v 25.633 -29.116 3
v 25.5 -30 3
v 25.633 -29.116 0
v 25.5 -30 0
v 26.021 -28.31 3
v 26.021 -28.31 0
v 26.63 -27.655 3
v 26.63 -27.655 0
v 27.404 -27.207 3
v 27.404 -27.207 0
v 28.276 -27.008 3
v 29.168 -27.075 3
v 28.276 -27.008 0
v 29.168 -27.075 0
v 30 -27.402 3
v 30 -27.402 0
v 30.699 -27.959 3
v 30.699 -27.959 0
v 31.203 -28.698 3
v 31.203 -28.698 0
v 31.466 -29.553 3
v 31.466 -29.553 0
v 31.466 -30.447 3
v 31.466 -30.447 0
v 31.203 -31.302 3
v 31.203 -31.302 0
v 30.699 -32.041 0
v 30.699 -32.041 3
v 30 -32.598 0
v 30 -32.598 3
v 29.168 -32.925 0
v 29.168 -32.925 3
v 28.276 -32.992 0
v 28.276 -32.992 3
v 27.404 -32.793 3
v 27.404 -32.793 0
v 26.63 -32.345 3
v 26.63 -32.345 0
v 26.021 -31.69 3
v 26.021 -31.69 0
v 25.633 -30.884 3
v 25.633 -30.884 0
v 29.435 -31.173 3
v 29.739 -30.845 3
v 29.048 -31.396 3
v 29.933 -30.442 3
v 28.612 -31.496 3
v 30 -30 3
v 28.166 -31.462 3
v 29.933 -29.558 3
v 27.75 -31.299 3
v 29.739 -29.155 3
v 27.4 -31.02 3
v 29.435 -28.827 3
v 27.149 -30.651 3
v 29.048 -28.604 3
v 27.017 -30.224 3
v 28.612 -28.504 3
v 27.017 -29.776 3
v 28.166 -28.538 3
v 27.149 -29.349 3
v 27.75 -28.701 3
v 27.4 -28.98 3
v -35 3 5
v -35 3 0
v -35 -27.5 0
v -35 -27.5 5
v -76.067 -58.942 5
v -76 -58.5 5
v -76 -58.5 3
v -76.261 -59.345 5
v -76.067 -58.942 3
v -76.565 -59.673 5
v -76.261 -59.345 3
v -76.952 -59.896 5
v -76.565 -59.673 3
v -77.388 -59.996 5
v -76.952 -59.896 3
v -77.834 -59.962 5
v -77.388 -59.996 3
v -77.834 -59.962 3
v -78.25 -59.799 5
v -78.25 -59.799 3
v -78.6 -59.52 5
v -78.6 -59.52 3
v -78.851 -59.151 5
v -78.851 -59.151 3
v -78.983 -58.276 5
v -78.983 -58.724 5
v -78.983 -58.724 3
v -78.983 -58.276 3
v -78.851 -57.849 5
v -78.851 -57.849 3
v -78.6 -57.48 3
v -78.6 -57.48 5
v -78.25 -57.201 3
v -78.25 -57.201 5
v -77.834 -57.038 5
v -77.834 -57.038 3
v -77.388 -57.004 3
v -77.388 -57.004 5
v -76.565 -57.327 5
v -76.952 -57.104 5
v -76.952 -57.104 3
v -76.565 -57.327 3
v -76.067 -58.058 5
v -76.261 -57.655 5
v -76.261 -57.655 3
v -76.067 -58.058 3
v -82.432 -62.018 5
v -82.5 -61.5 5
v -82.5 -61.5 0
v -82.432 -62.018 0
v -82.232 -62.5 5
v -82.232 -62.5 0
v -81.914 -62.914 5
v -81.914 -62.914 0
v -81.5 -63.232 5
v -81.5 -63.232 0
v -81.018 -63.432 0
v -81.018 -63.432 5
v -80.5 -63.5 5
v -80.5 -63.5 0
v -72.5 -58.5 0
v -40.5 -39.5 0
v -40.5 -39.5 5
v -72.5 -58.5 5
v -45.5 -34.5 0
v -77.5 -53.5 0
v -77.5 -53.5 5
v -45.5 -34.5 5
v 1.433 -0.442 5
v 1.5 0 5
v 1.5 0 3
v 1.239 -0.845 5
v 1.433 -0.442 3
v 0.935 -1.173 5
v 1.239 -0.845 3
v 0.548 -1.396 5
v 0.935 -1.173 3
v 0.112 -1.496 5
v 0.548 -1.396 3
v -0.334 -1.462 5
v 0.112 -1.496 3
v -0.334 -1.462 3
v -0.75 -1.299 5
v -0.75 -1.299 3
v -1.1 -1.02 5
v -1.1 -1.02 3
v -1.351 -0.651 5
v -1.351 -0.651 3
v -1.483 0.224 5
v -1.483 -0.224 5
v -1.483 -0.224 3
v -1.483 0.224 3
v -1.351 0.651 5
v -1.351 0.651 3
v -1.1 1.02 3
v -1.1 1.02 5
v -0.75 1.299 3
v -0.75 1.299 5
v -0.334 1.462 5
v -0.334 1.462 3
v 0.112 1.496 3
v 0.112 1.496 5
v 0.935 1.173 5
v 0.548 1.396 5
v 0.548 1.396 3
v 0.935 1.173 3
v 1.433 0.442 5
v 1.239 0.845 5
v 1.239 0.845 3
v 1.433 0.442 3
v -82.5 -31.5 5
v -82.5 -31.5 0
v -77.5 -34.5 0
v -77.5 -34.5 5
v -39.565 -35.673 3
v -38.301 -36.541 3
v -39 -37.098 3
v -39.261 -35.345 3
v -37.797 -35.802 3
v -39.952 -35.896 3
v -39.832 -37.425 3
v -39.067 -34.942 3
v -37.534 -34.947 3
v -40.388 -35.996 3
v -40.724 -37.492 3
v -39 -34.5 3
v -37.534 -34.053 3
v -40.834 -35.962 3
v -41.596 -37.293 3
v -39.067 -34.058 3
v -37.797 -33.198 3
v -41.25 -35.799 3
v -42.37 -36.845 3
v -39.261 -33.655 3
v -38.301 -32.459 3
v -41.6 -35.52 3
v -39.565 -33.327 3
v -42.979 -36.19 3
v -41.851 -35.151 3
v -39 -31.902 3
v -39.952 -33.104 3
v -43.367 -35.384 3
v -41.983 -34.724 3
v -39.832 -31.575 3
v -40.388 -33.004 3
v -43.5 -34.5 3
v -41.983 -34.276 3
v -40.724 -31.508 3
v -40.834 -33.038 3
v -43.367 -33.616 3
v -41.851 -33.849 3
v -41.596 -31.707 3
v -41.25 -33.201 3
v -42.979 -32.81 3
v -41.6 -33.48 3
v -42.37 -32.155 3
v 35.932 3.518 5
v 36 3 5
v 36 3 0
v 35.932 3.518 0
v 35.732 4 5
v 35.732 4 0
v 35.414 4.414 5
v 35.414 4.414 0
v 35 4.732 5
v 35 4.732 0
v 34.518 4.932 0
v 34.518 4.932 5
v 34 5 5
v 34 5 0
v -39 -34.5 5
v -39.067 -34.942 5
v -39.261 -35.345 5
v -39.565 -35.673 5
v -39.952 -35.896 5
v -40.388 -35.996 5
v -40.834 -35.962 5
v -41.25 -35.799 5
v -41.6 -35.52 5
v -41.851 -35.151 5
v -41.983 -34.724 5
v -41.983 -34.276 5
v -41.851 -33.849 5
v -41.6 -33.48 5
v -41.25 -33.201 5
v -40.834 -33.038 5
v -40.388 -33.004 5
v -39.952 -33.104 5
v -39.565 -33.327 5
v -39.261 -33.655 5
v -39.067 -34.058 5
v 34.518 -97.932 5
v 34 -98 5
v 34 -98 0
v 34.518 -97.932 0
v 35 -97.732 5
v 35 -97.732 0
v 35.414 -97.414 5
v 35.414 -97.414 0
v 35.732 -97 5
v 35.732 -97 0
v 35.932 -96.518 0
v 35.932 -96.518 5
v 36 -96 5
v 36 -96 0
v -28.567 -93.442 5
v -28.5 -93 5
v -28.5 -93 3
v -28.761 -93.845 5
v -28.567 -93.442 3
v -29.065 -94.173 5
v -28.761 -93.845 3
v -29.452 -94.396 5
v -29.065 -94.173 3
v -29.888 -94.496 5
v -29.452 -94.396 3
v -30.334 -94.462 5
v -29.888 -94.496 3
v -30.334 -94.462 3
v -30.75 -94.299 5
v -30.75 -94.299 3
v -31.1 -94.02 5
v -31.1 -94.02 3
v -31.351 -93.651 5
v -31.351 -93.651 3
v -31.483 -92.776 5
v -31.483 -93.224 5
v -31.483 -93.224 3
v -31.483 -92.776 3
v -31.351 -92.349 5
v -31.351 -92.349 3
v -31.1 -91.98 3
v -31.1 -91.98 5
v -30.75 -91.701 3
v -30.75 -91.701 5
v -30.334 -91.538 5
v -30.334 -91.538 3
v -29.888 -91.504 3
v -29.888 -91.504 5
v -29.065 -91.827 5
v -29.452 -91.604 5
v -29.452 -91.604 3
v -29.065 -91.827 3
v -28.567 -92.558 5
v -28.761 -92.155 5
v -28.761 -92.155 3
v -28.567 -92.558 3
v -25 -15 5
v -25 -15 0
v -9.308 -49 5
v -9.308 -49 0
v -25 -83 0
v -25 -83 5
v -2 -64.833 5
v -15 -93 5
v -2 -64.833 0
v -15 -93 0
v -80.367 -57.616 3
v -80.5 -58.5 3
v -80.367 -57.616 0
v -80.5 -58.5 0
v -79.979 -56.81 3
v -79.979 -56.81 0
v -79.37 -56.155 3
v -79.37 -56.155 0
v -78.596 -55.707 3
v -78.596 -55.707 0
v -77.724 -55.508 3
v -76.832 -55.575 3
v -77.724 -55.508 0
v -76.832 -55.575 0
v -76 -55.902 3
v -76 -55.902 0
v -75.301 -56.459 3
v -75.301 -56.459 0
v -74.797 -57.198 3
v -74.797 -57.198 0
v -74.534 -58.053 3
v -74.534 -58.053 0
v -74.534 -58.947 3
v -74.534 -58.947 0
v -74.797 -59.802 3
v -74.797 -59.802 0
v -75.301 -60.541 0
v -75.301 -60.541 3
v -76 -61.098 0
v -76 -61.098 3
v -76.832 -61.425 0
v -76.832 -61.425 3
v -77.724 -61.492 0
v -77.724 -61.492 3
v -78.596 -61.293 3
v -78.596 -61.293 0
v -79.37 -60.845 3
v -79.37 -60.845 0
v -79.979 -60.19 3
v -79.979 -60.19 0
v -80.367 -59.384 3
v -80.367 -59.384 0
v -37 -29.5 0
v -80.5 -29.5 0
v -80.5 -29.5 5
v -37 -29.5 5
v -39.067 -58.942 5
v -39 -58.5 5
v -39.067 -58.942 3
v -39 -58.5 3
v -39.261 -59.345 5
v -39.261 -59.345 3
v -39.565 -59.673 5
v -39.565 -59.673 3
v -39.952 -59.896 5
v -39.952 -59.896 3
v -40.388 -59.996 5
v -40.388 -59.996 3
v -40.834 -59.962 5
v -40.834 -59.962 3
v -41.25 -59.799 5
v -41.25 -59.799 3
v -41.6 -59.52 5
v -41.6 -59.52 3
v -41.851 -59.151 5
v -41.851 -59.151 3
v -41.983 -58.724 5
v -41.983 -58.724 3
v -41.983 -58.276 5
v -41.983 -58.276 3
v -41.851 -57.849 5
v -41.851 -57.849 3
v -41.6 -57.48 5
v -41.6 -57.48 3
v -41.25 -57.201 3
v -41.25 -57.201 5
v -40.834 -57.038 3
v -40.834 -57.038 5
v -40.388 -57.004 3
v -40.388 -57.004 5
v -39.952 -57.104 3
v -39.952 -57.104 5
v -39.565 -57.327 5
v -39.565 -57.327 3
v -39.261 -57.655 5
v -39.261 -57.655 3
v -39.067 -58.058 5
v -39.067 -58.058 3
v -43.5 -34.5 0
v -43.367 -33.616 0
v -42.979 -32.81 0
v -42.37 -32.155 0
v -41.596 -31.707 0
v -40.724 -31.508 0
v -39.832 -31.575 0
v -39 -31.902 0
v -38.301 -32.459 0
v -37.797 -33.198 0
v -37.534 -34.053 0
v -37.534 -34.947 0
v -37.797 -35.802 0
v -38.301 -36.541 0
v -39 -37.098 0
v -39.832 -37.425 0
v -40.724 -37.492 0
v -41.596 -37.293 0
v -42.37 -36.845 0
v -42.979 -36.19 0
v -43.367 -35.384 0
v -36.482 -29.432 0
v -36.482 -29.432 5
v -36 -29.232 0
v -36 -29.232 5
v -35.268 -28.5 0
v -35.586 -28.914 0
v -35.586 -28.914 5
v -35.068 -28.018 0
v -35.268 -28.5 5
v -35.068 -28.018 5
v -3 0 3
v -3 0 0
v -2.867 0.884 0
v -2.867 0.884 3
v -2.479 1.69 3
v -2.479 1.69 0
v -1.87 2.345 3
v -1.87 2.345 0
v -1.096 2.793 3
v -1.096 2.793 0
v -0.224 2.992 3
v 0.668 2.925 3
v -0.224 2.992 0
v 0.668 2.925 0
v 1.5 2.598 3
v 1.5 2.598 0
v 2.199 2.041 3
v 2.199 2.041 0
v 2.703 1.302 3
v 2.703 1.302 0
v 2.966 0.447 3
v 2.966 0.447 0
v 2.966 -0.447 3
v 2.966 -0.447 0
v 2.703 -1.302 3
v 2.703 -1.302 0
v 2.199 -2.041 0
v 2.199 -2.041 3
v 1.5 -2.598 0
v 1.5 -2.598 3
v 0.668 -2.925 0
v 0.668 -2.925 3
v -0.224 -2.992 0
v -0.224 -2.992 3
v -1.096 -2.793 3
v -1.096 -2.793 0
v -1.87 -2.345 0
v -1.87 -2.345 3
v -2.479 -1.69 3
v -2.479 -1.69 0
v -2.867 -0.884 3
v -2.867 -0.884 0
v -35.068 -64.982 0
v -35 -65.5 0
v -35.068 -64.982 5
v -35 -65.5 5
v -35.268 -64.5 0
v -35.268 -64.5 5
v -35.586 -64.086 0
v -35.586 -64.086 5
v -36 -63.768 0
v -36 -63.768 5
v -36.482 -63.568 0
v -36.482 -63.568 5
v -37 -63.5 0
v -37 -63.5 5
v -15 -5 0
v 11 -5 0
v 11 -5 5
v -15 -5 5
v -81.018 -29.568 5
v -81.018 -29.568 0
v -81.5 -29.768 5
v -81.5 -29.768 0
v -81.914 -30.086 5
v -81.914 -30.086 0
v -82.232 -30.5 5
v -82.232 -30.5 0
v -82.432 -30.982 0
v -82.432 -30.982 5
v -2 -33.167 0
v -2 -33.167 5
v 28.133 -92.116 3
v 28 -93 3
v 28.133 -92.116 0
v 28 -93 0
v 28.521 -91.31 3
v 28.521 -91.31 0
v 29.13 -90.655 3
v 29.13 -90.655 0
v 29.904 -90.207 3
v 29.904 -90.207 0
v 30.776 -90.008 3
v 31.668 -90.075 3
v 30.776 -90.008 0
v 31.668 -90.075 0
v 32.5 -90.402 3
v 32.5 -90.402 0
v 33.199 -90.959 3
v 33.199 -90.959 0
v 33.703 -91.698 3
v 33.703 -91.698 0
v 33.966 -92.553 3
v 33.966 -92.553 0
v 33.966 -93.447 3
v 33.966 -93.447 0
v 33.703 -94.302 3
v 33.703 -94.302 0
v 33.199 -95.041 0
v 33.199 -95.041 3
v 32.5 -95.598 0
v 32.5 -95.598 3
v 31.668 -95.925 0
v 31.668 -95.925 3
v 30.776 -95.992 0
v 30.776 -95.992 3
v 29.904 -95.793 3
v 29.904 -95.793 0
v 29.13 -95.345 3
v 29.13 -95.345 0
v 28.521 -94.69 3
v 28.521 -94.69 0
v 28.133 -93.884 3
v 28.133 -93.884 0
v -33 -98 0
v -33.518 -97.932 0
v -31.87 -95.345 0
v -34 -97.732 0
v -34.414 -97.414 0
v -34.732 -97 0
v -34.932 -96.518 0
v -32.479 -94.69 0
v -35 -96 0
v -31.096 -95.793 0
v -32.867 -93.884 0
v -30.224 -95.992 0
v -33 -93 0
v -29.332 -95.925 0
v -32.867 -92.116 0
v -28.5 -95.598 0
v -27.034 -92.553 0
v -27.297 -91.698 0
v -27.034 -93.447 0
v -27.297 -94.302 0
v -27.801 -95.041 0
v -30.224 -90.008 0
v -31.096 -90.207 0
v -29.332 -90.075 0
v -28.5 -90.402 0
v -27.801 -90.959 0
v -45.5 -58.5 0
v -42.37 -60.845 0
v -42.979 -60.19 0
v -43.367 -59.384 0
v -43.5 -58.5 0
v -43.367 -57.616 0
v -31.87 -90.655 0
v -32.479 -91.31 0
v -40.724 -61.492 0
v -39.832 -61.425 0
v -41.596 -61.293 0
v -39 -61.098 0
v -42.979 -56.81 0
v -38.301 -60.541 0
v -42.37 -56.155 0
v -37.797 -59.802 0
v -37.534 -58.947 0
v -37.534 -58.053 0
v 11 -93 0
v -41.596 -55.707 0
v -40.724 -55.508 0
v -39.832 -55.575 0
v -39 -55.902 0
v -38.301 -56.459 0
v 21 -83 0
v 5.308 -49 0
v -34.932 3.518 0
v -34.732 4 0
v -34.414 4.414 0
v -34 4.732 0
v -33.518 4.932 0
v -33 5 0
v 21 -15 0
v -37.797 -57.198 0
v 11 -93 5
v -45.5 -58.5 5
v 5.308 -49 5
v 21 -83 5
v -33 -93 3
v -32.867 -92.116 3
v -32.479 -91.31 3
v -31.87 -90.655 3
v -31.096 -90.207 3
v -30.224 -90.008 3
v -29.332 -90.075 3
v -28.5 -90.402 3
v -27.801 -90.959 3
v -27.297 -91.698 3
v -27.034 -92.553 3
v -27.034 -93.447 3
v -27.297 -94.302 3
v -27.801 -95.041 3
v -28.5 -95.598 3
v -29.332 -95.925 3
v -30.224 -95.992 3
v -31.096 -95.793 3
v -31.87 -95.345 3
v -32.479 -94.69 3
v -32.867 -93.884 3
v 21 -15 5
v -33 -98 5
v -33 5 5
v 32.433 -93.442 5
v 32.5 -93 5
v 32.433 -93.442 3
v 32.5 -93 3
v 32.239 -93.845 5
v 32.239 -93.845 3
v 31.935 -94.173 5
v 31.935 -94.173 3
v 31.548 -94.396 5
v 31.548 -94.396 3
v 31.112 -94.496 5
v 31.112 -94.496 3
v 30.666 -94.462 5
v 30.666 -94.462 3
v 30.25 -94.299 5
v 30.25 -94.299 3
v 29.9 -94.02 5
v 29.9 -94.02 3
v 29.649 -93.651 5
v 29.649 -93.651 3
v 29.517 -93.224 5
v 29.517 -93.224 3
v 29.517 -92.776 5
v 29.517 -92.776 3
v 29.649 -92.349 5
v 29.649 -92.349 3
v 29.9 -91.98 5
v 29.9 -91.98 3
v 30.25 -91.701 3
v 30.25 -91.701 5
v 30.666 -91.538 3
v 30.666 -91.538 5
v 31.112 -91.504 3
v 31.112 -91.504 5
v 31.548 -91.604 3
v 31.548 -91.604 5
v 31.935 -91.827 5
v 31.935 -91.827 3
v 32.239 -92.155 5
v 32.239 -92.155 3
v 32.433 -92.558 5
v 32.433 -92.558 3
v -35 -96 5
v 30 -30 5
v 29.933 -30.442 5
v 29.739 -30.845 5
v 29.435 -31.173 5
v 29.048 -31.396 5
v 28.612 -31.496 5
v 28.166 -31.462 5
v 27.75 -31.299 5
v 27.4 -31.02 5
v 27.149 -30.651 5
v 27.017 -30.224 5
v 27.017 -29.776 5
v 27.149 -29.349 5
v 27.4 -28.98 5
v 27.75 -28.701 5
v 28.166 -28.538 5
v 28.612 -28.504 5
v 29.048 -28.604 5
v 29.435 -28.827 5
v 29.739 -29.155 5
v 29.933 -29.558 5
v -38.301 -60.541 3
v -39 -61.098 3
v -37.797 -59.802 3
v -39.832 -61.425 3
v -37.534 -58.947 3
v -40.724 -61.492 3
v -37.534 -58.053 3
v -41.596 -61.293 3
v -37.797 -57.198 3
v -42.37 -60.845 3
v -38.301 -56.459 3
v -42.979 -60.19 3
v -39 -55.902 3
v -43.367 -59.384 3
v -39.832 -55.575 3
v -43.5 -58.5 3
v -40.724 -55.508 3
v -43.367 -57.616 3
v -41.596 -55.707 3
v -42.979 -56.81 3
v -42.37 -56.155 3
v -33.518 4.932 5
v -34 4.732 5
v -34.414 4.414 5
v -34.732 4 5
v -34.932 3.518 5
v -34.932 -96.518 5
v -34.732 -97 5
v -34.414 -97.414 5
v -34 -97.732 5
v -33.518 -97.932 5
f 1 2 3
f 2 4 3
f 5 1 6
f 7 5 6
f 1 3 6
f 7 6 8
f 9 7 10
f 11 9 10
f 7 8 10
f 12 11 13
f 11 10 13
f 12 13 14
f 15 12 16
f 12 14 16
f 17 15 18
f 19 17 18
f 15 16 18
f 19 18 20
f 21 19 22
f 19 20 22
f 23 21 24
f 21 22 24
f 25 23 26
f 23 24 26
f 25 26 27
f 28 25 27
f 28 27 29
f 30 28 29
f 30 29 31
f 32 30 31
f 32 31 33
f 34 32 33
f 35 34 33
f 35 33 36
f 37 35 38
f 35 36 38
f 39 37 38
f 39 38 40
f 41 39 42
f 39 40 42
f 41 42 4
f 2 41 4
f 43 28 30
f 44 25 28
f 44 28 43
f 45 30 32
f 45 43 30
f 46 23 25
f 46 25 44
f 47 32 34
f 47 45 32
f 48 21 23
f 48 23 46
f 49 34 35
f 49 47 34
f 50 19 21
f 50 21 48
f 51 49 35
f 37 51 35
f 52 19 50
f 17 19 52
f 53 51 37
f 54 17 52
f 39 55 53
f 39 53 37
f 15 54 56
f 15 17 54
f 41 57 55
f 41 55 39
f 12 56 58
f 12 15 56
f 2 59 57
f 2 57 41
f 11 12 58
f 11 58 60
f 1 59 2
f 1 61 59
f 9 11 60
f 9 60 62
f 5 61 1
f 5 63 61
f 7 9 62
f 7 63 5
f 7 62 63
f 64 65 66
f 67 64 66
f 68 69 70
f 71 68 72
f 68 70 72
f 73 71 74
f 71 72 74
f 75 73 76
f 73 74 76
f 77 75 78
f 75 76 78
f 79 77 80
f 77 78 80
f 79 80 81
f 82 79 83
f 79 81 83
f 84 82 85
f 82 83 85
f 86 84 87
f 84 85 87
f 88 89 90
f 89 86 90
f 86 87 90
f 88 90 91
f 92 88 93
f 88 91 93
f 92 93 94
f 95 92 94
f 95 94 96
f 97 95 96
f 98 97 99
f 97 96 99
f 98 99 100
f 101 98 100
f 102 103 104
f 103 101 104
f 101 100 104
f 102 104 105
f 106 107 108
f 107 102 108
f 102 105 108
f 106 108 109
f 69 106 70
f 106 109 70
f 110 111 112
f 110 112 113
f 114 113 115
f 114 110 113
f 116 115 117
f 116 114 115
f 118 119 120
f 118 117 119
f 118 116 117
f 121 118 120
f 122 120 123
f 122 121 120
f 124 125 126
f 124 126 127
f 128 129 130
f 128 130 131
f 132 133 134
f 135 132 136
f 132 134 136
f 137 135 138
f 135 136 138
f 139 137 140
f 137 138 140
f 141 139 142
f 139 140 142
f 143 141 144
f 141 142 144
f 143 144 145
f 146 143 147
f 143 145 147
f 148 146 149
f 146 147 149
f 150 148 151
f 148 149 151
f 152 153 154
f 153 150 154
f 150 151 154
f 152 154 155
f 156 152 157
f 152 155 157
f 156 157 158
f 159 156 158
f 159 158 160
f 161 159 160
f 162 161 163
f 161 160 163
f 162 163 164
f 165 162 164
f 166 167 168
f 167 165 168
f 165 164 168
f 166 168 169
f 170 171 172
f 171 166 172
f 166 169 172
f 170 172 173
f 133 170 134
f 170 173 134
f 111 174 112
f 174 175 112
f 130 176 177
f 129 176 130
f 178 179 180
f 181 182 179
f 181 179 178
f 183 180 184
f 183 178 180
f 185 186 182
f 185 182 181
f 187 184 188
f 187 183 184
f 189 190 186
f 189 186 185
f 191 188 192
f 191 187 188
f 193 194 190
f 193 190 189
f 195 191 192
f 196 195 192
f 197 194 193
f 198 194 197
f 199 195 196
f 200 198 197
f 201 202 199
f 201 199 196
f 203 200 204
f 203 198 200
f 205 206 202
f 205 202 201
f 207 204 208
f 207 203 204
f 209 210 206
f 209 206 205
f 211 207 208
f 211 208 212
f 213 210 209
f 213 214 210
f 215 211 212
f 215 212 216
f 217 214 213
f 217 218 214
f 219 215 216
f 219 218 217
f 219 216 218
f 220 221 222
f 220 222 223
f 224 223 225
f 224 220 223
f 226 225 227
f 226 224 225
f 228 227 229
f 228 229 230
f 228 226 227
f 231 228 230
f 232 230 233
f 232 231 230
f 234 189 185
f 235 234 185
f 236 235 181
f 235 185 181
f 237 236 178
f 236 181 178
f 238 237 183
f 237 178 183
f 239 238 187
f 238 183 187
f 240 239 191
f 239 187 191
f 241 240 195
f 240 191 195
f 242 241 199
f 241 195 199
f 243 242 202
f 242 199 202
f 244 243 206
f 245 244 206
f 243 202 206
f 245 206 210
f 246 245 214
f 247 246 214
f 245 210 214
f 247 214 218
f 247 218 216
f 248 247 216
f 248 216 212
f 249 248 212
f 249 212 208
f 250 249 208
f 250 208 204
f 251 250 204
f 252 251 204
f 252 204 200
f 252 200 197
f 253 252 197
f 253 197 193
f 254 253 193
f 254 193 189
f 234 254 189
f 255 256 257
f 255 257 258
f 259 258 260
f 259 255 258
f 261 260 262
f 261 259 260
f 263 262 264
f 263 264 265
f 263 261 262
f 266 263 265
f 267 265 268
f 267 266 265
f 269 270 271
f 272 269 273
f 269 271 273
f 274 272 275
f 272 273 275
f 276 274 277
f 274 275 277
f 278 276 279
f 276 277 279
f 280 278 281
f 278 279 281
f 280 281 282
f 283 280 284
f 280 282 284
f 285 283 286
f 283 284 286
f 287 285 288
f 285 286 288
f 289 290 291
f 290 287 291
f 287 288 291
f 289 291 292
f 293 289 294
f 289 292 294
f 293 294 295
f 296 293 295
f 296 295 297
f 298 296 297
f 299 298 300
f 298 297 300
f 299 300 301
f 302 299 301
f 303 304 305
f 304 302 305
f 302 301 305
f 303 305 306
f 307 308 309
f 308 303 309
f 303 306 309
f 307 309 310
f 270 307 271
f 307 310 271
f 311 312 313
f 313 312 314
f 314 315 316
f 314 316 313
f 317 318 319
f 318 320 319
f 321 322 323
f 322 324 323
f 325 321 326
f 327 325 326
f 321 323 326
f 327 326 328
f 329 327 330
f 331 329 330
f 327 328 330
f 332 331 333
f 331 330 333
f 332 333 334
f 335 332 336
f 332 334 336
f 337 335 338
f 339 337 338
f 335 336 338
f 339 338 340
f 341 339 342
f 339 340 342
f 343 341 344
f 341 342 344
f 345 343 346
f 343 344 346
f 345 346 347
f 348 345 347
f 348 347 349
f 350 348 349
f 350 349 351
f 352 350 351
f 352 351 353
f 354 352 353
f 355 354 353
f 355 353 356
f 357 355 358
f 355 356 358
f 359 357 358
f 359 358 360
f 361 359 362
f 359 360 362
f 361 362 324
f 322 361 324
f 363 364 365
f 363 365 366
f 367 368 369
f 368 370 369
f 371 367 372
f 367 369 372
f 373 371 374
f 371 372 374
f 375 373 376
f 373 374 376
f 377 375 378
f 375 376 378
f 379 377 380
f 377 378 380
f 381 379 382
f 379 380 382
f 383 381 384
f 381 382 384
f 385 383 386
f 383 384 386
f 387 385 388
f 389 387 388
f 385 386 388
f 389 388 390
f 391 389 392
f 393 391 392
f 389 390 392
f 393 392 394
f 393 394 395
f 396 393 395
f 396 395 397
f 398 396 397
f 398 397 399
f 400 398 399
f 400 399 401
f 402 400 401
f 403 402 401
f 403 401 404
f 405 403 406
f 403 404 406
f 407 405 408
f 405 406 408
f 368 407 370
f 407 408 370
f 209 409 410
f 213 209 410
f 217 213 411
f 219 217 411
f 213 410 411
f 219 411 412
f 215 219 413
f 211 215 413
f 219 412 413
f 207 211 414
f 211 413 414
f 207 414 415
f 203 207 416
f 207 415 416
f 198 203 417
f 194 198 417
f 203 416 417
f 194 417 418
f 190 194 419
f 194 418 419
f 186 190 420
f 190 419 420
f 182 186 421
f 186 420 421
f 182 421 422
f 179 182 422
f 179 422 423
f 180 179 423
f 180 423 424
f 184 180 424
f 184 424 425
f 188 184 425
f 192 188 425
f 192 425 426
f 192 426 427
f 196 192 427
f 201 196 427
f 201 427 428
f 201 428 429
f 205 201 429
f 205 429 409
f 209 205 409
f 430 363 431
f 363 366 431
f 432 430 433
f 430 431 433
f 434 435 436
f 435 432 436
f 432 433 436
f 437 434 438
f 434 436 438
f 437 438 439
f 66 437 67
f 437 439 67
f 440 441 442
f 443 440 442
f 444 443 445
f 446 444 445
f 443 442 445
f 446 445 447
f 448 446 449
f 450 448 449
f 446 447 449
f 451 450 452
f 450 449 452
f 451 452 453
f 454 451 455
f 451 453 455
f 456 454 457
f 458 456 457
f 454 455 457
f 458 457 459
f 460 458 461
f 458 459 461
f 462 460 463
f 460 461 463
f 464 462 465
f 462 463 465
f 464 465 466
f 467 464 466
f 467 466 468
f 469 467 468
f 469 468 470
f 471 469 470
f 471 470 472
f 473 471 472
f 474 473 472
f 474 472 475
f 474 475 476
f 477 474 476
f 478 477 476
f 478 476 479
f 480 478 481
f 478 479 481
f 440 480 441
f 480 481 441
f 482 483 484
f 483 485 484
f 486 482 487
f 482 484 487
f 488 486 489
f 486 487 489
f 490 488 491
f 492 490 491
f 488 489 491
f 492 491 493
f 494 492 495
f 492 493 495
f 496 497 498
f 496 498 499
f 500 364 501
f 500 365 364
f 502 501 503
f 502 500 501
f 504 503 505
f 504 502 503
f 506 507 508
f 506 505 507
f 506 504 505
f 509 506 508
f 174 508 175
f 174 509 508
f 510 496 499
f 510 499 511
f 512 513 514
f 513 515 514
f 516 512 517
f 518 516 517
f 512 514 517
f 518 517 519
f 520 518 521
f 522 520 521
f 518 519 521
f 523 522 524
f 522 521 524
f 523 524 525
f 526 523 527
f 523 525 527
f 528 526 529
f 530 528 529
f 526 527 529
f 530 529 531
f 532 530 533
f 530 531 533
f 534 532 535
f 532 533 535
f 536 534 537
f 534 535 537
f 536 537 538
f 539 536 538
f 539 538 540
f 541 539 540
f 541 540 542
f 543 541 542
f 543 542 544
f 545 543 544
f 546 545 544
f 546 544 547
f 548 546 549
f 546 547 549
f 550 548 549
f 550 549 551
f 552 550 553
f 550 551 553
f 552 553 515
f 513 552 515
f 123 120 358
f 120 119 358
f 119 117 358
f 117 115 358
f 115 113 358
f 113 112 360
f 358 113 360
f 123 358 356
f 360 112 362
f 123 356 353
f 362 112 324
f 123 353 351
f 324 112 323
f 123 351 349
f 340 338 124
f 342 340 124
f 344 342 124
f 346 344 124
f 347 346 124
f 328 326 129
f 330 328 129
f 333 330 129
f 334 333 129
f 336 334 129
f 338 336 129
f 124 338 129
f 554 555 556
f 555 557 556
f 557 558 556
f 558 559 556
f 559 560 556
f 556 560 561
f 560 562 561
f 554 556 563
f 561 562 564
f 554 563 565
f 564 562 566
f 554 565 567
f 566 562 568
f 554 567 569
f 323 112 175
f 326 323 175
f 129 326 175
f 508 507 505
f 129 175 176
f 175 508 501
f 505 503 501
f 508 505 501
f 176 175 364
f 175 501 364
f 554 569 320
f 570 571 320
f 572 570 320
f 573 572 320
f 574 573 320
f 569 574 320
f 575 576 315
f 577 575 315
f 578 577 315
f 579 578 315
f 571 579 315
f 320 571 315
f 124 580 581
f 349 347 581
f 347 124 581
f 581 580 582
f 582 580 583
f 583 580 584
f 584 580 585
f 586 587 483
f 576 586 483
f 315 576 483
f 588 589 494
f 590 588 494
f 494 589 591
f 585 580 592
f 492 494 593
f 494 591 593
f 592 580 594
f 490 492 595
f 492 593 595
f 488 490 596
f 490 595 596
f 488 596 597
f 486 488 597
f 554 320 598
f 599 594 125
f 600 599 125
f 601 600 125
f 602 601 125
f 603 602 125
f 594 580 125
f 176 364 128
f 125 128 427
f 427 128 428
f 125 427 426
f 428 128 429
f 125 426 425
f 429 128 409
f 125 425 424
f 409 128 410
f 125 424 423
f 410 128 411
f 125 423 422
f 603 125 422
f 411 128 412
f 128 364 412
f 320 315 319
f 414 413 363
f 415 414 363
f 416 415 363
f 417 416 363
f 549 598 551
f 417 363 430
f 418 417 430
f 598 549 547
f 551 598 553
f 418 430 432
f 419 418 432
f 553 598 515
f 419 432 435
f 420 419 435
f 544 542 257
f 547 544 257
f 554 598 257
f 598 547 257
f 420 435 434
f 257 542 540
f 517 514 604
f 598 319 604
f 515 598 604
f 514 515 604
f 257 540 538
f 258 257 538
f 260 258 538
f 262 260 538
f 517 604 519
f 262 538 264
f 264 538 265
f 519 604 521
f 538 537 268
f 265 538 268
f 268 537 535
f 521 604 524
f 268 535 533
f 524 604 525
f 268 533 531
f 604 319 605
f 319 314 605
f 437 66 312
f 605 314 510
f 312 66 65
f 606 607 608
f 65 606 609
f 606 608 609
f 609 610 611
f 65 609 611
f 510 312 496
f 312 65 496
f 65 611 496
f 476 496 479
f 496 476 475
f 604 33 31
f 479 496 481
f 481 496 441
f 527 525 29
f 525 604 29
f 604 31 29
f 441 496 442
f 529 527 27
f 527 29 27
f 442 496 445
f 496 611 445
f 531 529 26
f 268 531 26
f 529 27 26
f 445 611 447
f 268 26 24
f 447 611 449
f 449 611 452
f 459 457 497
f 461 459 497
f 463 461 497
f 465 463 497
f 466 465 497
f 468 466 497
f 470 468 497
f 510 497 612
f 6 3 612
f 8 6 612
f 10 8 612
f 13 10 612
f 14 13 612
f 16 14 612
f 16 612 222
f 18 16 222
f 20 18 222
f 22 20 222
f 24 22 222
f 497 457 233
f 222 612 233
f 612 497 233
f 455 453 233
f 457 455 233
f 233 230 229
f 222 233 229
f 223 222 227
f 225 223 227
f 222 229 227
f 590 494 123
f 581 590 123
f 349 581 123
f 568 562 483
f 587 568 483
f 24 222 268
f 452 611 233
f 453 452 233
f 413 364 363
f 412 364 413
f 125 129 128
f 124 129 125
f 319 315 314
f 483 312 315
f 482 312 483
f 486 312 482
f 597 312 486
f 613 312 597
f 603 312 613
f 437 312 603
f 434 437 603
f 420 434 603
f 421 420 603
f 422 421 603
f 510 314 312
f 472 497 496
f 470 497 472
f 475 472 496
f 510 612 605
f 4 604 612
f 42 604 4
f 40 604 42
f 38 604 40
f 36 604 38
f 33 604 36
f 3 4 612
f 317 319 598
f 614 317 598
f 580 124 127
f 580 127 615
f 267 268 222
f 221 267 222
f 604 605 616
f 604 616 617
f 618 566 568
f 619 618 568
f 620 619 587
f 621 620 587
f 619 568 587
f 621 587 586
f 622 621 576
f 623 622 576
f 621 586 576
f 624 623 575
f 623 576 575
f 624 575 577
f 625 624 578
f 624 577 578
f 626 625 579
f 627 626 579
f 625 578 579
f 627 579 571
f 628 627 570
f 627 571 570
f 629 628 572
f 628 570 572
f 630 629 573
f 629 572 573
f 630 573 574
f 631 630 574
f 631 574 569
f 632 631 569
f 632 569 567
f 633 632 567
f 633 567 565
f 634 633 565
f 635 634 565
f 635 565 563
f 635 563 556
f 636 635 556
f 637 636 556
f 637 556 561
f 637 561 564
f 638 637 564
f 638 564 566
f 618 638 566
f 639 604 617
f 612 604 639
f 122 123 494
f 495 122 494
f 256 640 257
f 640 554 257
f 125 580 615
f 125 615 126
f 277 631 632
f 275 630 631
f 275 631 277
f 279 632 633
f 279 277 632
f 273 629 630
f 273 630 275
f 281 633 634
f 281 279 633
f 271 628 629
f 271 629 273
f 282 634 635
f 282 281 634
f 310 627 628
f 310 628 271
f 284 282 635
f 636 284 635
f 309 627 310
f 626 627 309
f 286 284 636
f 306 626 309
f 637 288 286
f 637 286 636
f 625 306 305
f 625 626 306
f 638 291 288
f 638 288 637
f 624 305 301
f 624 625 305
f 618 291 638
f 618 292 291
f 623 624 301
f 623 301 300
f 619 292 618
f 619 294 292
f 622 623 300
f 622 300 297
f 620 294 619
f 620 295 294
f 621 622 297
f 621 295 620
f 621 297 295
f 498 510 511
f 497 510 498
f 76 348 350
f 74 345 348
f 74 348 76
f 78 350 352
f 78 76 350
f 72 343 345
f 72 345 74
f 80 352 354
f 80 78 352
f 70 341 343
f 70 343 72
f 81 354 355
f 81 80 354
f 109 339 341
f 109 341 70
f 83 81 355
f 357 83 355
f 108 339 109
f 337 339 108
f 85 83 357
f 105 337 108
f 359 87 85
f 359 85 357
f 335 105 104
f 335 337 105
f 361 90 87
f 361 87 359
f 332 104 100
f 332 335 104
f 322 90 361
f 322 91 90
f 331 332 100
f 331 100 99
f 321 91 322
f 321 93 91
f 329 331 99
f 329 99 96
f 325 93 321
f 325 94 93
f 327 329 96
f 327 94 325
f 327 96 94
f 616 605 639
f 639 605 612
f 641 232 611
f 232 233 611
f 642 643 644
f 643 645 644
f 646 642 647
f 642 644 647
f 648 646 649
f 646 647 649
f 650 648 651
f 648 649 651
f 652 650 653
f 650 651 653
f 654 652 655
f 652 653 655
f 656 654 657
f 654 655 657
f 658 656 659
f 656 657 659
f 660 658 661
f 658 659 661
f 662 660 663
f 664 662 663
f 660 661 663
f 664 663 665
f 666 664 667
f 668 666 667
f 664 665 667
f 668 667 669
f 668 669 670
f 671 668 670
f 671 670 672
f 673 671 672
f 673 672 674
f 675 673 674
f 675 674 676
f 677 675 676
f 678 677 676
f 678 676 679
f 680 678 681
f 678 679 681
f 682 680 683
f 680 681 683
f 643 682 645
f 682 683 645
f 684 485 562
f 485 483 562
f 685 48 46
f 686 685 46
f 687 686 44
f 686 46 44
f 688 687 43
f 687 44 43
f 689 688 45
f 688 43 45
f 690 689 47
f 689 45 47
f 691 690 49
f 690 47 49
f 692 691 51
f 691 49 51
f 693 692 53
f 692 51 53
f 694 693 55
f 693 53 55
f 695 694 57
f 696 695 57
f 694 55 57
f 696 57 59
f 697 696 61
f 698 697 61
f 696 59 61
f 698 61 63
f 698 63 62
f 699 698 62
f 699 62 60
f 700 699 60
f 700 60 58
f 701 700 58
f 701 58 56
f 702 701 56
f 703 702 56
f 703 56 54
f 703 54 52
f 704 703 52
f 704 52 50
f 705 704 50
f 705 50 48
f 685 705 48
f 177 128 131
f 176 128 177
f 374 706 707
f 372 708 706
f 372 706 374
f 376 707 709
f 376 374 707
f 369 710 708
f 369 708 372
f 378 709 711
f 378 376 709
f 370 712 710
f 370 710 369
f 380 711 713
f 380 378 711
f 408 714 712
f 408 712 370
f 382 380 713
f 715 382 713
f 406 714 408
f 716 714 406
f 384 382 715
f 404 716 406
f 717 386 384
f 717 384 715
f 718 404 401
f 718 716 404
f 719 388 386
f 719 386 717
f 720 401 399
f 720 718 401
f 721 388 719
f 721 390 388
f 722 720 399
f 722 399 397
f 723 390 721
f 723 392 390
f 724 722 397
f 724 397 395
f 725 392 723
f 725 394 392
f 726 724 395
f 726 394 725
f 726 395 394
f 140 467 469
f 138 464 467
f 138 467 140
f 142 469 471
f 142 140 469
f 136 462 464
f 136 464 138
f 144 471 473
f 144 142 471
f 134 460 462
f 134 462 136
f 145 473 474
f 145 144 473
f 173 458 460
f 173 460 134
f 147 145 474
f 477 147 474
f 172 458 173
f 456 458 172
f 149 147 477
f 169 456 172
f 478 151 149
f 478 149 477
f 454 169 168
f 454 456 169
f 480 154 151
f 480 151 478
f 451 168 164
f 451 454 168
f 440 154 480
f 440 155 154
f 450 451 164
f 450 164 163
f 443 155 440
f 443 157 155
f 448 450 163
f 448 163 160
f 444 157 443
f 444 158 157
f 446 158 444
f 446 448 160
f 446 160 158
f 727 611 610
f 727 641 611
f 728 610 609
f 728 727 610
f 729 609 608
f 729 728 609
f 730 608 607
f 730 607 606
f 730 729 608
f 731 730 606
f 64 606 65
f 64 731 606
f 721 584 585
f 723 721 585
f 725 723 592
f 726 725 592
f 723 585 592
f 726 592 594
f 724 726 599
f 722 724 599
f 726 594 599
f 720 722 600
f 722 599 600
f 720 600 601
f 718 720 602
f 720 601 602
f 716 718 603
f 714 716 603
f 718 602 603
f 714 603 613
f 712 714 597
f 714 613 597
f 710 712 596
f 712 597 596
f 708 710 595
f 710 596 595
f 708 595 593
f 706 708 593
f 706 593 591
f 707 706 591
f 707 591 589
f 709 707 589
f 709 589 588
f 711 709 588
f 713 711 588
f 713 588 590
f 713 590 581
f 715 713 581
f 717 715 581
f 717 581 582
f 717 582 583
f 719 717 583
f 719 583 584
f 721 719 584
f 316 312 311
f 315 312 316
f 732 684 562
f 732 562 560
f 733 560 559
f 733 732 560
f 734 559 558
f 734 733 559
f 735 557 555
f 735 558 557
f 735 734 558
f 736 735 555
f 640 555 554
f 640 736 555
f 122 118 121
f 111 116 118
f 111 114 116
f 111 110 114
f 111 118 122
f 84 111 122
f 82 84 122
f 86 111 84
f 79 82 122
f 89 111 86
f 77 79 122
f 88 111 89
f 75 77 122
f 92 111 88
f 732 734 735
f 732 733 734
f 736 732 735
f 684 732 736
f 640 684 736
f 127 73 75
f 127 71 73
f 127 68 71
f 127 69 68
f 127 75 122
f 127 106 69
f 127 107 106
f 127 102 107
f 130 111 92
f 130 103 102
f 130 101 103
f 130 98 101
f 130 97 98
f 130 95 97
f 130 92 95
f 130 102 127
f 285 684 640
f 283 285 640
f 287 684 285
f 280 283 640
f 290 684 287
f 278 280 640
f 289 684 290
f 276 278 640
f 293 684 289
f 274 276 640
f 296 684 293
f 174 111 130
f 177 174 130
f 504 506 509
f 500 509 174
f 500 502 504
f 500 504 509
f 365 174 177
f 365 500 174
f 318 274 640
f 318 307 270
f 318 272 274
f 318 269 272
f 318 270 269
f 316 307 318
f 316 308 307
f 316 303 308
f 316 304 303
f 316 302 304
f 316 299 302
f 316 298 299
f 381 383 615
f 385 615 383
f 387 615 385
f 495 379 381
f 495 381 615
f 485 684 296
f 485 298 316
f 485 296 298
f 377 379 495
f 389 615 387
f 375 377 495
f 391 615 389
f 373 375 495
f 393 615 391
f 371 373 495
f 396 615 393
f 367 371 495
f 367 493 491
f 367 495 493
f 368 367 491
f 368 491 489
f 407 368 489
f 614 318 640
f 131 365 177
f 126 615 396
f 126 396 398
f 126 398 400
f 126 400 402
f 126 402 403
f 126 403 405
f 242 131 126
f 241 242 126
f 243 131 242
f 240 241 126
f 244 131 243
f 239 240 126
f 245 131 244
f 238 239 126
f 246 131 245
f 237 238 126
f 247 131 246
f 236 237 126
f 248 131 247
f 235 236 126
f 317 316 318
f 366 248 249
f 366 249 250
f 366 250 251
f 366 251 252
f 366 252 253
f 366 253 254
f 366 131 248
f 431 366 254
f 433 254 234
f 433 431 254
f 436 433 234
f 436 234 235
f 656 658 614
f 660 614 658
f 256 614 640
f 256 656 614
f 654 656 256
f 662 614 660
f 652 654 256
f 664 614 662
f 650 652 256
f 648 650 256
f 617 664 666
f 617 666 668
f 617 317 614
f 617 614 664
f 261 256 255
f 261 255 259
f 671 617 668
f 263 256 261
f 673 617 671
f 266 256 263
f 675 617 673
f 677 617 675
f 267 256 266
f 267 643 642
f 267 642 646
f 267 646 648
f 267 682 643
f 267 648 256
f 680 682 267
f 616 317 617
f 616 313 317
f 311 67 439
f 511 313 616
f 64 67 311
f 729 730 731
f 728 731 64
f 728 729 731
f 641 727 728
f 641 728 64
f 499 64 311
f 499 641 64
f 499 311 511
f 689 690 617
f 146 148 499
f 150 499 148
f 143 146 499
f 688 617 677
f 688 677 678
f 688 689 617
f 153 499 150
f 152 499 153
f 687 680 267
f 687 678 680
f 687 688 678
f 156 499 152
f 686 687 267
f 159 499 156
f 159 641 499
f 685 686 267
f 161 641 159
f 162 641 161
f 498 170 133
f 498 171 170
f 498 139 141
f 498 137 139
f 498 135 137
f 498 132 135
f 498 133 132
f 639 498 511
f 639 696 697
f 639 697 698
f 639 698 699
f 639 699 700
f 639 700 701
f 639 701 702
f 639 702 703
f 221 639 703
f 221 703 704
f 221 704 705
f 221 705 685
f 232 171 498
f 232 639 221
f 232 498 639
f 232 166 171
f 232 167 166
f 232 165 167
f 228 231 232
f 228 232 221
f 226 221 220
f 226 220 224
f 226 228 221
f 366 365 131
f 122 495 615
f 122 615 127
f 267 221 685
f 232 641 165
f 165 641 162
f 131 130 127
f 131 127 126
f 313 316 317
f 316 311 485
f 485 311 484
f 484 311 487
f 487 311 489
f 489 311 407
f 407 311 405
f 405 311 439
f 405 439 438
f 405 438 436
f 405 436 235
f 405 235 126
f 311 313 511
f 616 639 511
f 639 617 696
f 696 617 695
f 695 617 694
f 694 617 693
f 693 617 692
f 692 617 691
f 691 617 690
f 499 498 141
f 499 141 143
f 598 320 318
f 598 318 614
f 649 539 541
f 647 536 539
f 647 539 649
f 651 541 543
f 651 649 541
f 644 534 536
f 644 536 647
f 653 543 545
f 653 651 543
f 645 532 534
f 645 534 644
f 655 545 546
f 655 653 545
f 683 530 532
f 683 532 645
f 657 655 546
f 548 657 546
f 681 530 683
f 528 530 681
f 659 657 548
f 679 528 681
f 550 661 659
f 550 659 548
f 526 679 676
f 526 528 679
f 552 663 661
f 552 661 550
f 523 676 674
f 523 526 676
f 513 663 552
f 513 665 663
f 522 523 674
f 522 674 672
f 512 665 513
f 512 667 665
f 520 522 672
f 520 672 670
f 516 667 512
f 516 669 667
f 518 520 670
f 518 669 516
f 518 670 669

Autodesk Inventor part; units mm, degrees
ref_plane "YZ Plane" through (0, 0, 0) normal (1, 0, 0) x (0, 1, 0)
ref_plane "XZ Plane" through (0, 0, 0) normal (0, 1, 0) x (-1, 0, 0)
ref_plane "XY Plane" through (0, 0, 0) normal (0, 0, 1) x (1, 0, 0)
sketch "Boceto1" plane through (0, 0, 0) normal (0, 0, 1) x (1, 0, 0)
  circle A0 centre (0, 0) radius 1.5
  line L0 (0, 0) -> (28.5, 0)
  line L1 (28.5, 0) -> (28.5, -30)
  circle A1 centre (28.5, -30) radius 1.5
  line L2 (28.5, -30) -> (28.5, -93)
  line L3 (28.5, -93) -> (31, -93)
  circle A2 centre (31, -93) radius 1.5
  line L4 (31, -93) -> (-30, -93)
  circle A3 centre (-30, -93) radius 1.5
  line L5 (-30, -98) -> (31, -98)
  line L6 (31, -98) -> (36, -98)
  line L7 (36, -98) -> (36, 0)
  line L8 (36, 0) -> (36, 5)
  line L9 (36, 5) -> (-30, 5)
  line L10 (-30, 5) -> (-35, 5)
  line L11 (-35, 5) -> (-35, -98)
  line L12 (-35, -98) -> (-30, -98)
  line L13 (-40.5, -46.5) -> (-40.5, -34.5)
  line L14 (-40.5, -46.5) -> (-40.5, -58.5)
  circle A4 centre (-40.5, -34.5) radius 1.5
  circle A5 centre (-40.5, -58.5) radius 1.5
  line L15 (-40.5, -58.5) -> (-77.5, -58.5)
  circle A6 centre (-77.5, -58.5) radius 1.5
  line L16 (-82.5, -58.5) -> (-82.5, -63.5)
  line L17 (-82.5, -63.5) -> (-35, -63.5)
  line L18 (-82.5, -58.5) -> (-82.5, -34.5)
  line L19 (-82.5, -34.5) -> (-82.5, -29.5)
  line L20 (-82.5, -29.5) -> (-38, -29.5)
  line L21 (-38, -29.5) -> (-35, -29.5)
  line L22 (-60.25, -58.5) -> (-77.5, -58.5)
  dimension "d0" = 3
  dimension "d1" = 28.5
  dimension "d2" = 30
  dimension "d3" = 3
  dimension "d4" = 63
  dimension "d5" = 2.5
  dimension "d6" = 3
  dimension "d7" = 61
  dimension "d8" = 3
  dimension "d9" = 5
  dimension "d10" = 5
  dimension "d11" = 5
  dimension "d12" = 5
  dimension "d15" = 12
  dimension "d16" = 12
  dimension "d17" = 3
  dimension "d18" = 3
  dimension "d19" = 37
  dimension "d20" = 3
  dimension "d21" = 5
  dimension "d22" = 5
  dimension "d23" = 5
extrude "Extrusión1" add sketch "Boceto1" along normal blind 5
sketch "Boceto2" plane through (0, 0, 0) normal (0, 0, -1) x (-1, 0, 0)
  circle A0 centre (0, 0) radius 1.5 projected
  circle A1 centre (0, 0) radius 3
  circle A2 centre (-28.5, -30) radius 1.5 projected
  circle A3 centre (-28.5, -30) radius 3
  circle A4 centre (-31, -93) radius 1.5 projected
  circle A5 centre (-31, -93) radius 3
  circle A6 centre (30, -93) radius 1.5 projected
  circle A7 centre (30, -93) radius 3
  circle A8 centre (40.5, -58.5) radius 1.5 projected
  circle A9 centre (40.5, -58.5) radius 3
  circle A10 centre (77.5, -58.5) radius 1.5 projected
  circle A11 centre (77.5, -58.5) radius 3
  circle A12 centre (40.5, -34.5) radius 1.5 projected
  circle A13 centre (40.5, -34.5) radius 3
  dimension "d28" = 6
  dimension "d29" = 6
  dimension "d30" = 6
  dimension "d31" = 6
  dimension "d32" = 6
  dimension "d33" = 6
extrude "Extrusión2" cut sketch "Boceto2" against normal blind 3
sketch "Boceto3" plane through (0, 0, 0) normal (0, 0, -1) x (-1, 0, 0)
  circle A0 centre (-28.5, -30) radius 1.5 projected
  line L0 (-28.5, -30) -> (-21, -30)
  circle A1 centre (0, 0) radius 1.5 projected
  line L1 (0, 0) -> (0, -5)
  circle A2 centre (30, -93) radius 1.5 projected
  line L2 (30, -93) -> (25, -93)
  circle A3 centre (-31, -93) radius 1.5 projected
  line L3 (-31, -93) -> (-24.75, -93)
  line L4 (-24.75, -93) -> (-21, -93)
  circle A4 centre (40.5, -34.5) radius 1.5 projected
  line L5 (40.5, -34.5) -> (40.5, -39.5)
  line L6 (40.5, -34.5) -> (45.5, -34.5)
  circle A5 centre (40.5, -58.5) radius 3 projected
  line L7 (40.5, -58.5) -> (45.5, -58.5)
  circle A6 centre (77.5, -58.5) radius 1.5 projected
  line L8 (77.5, -58.5) -> (77.5, -53.5)
  line L9 (77.5, -53.5) -> (45.5, -34.5)
  line L10 (45.5, -34.5) -> (77.5, -34.5)
  line L11 (77.5, -34.5) -> (77.5, -53.5)
  line L12 (77.5, -58.5) -> (72.5, -58.5)
  line L13 (72.5, -58.5) -> (45.5, -58.5)
  line L14 (40.5, -39.5) -> (72.5, -58.5)
  line L15 (45.5, -58.5) -> (40.5, -39.5)
  line L16 (45.5, -58.5) -> (72.5, -58.5)
  line L17 (59, -58.5) -> (43, -49)
  line L18 (25, -49) -> (2, -5)
  line L19 (-21, -5) -> (-9.5, -27)
  line L20 (13.5, -49) -> (2, -27)
  line L21 (-10.5, -5) -> (2, -27)
  line L22 (-9.5, -49) -> (-21, -27)
  line L23 (25, -27) -> (12.5, -5)
  line L24 (12.5, -5) -> (25, -5)
  line L25 (25, -27) -> (25, -5)
  line L26 (13.5, -49) -> (25, -49)
  line L27 (-21, -27) -> (-9.5, -49)
  line L28 (-21, -27) -> (-21, -5)
  line L29 (-21, -93) -> (-21, -71)
  line L30 (13.5, -93) -> (-9.5, -49)
  line L31 (25, -71) -> (13.5, -49)
  line L32 (-21, -71.6828) -> (-21, -93)
  line L33 (-21, -71.6828) -> (-9.5, -93)
  line L34 (-9.5, -93) -> (-21, -93)
  line L35 (-21, -49) -> (-9.5, -49)
  line L36 (-9.5, -49) -> (13.5, -93)
  line L37 (13.5, -93) -> (2, -93)
  line L38 (25, -71) -> (25, -93)
  line L39 (2, -49) -> (25, -93)
  line L40 (-9.5, -27) -> (2, -49)
  line L41 (2, -49) -> (-9.5, -49)
  line L42 (-21, -27) -> (-21, -5)
  line L43 (-21, -49) -> (-9.5, -49)
  line L44 (-21, -49) -> (2, -93)
  line L45 (2, -93) -> (13.5, -93)
  line L46 (-9.5, -49) -> (13.5, -93)
  line L47 (2, -5) -> (0, -5)
  line L48 (-10.5, -5) -> (0, -5)
  line L49 (2, -49) -> (13.5, -49)
  line L50 (12.5, -5) -> (25, -27)
  line L51 (25, -27) -> (25, -5)
  line L52 (25, -5) -> (12.5, -5)
  line L53 (-21, -27) -> (-21, -5)
  line L54 (-21, -27) -> (-21, -5)
  line L55 (-21, -5) -> (2, -49)
  line L56 (2, -49) -> (-9.5, -49)
  line L57 (-9.5, -49) -> (-21, -27)
  dimension "d36" = 7.5
  dimension "d37" = 5
  dimension "d38" = 5
  dimension "d39" = 5
  dimension "d40" = 5
  dimension "d41" = 5
  dimension "d42" = 5
extrude "Extrusión3" cut sketch "Boceto3" against normal blind 5 contours L10 L11 L9 | L14 L13 L17 L15 | L17 L13 L15 | L26 L20 L21 L48 L47 L18 | L30 L37 L44 L35 | L41 L22 L28 L19 L40 | L31 L38 L39 L49 | L23 L24 L25 | L29 L33 L34
fillet "Empalme1" radius 2 6 edges at (36, -98, 2.5) (-35, -98, 2.5) (-82.5, -63.5, 2.5) (-82.5, -29.5, 2.5) (-35, 5, 2.5) (36, 5, 2.5)
fillet "Empalme2" radius 2 2 edges at (-35, -63.5, 2.5) (-35, -29.5, 2.5)
sketch "Boceto4" plane through (0, 0, 0) normal (0, 0, -1) x (-1, 0, 0)
  line L0 (2, -49) -> (-21, -5) projected
  line L1 (12.5, -5) -> (25, -5) projected
  line L2 (-21, -5) -> (25, -5)
  line L3 (25, -93) -> (2, -49) projected
  line L4 (25, -5) -> (25, -93)
  line L5 (25, -93) -> (-21, -93)
  line L6 (-21, -93) -> (-21, -5)
  point P0 (0, 0)
extrude "Extrusión4" cut sketch "Boceto4" against normal blind 5
sketch "Boceto5" plane through (0, 0, 0) normal (0, 0, -1) x (-1, 0, 0)
  line L0 (-21, -5) -> (-21, -15)
  line L1 (-21, -5) -> (-11, -5)
  line L2 (25, -93) -> (15, -93)
  line L3 (15, -93) -> (-21, -15)
  line L4 (25, -93) -> (25, -83)
  line L5 (25, -83) -> (-11, -5)
  line L6 (-21, -93) -> (-21, -83)
  line L7 (-21, -93) -> (-11, -93)
  line L8 (25, -5) -> (15, -5)
  line L9 (25, -5) -> (25, -15)
  line L10 (25, -15) -> (-11, -93)
  line L11 (15, -5) -> (-21, -83)
  point P0 (0, 0)
  dimension "d49" = 10
  dimension "d50" = 10
  dimension "d51" = 10
  dimension "d52" = 10
  dimension "d53" = 10
  dimension "d54" = 10
  dimension "d55" = 10
  dimension "d56" = 10
extrude "Extrusión5" add sketch "Boceto5" against normal blind 5
properties part number "soporte_nuc_up"
